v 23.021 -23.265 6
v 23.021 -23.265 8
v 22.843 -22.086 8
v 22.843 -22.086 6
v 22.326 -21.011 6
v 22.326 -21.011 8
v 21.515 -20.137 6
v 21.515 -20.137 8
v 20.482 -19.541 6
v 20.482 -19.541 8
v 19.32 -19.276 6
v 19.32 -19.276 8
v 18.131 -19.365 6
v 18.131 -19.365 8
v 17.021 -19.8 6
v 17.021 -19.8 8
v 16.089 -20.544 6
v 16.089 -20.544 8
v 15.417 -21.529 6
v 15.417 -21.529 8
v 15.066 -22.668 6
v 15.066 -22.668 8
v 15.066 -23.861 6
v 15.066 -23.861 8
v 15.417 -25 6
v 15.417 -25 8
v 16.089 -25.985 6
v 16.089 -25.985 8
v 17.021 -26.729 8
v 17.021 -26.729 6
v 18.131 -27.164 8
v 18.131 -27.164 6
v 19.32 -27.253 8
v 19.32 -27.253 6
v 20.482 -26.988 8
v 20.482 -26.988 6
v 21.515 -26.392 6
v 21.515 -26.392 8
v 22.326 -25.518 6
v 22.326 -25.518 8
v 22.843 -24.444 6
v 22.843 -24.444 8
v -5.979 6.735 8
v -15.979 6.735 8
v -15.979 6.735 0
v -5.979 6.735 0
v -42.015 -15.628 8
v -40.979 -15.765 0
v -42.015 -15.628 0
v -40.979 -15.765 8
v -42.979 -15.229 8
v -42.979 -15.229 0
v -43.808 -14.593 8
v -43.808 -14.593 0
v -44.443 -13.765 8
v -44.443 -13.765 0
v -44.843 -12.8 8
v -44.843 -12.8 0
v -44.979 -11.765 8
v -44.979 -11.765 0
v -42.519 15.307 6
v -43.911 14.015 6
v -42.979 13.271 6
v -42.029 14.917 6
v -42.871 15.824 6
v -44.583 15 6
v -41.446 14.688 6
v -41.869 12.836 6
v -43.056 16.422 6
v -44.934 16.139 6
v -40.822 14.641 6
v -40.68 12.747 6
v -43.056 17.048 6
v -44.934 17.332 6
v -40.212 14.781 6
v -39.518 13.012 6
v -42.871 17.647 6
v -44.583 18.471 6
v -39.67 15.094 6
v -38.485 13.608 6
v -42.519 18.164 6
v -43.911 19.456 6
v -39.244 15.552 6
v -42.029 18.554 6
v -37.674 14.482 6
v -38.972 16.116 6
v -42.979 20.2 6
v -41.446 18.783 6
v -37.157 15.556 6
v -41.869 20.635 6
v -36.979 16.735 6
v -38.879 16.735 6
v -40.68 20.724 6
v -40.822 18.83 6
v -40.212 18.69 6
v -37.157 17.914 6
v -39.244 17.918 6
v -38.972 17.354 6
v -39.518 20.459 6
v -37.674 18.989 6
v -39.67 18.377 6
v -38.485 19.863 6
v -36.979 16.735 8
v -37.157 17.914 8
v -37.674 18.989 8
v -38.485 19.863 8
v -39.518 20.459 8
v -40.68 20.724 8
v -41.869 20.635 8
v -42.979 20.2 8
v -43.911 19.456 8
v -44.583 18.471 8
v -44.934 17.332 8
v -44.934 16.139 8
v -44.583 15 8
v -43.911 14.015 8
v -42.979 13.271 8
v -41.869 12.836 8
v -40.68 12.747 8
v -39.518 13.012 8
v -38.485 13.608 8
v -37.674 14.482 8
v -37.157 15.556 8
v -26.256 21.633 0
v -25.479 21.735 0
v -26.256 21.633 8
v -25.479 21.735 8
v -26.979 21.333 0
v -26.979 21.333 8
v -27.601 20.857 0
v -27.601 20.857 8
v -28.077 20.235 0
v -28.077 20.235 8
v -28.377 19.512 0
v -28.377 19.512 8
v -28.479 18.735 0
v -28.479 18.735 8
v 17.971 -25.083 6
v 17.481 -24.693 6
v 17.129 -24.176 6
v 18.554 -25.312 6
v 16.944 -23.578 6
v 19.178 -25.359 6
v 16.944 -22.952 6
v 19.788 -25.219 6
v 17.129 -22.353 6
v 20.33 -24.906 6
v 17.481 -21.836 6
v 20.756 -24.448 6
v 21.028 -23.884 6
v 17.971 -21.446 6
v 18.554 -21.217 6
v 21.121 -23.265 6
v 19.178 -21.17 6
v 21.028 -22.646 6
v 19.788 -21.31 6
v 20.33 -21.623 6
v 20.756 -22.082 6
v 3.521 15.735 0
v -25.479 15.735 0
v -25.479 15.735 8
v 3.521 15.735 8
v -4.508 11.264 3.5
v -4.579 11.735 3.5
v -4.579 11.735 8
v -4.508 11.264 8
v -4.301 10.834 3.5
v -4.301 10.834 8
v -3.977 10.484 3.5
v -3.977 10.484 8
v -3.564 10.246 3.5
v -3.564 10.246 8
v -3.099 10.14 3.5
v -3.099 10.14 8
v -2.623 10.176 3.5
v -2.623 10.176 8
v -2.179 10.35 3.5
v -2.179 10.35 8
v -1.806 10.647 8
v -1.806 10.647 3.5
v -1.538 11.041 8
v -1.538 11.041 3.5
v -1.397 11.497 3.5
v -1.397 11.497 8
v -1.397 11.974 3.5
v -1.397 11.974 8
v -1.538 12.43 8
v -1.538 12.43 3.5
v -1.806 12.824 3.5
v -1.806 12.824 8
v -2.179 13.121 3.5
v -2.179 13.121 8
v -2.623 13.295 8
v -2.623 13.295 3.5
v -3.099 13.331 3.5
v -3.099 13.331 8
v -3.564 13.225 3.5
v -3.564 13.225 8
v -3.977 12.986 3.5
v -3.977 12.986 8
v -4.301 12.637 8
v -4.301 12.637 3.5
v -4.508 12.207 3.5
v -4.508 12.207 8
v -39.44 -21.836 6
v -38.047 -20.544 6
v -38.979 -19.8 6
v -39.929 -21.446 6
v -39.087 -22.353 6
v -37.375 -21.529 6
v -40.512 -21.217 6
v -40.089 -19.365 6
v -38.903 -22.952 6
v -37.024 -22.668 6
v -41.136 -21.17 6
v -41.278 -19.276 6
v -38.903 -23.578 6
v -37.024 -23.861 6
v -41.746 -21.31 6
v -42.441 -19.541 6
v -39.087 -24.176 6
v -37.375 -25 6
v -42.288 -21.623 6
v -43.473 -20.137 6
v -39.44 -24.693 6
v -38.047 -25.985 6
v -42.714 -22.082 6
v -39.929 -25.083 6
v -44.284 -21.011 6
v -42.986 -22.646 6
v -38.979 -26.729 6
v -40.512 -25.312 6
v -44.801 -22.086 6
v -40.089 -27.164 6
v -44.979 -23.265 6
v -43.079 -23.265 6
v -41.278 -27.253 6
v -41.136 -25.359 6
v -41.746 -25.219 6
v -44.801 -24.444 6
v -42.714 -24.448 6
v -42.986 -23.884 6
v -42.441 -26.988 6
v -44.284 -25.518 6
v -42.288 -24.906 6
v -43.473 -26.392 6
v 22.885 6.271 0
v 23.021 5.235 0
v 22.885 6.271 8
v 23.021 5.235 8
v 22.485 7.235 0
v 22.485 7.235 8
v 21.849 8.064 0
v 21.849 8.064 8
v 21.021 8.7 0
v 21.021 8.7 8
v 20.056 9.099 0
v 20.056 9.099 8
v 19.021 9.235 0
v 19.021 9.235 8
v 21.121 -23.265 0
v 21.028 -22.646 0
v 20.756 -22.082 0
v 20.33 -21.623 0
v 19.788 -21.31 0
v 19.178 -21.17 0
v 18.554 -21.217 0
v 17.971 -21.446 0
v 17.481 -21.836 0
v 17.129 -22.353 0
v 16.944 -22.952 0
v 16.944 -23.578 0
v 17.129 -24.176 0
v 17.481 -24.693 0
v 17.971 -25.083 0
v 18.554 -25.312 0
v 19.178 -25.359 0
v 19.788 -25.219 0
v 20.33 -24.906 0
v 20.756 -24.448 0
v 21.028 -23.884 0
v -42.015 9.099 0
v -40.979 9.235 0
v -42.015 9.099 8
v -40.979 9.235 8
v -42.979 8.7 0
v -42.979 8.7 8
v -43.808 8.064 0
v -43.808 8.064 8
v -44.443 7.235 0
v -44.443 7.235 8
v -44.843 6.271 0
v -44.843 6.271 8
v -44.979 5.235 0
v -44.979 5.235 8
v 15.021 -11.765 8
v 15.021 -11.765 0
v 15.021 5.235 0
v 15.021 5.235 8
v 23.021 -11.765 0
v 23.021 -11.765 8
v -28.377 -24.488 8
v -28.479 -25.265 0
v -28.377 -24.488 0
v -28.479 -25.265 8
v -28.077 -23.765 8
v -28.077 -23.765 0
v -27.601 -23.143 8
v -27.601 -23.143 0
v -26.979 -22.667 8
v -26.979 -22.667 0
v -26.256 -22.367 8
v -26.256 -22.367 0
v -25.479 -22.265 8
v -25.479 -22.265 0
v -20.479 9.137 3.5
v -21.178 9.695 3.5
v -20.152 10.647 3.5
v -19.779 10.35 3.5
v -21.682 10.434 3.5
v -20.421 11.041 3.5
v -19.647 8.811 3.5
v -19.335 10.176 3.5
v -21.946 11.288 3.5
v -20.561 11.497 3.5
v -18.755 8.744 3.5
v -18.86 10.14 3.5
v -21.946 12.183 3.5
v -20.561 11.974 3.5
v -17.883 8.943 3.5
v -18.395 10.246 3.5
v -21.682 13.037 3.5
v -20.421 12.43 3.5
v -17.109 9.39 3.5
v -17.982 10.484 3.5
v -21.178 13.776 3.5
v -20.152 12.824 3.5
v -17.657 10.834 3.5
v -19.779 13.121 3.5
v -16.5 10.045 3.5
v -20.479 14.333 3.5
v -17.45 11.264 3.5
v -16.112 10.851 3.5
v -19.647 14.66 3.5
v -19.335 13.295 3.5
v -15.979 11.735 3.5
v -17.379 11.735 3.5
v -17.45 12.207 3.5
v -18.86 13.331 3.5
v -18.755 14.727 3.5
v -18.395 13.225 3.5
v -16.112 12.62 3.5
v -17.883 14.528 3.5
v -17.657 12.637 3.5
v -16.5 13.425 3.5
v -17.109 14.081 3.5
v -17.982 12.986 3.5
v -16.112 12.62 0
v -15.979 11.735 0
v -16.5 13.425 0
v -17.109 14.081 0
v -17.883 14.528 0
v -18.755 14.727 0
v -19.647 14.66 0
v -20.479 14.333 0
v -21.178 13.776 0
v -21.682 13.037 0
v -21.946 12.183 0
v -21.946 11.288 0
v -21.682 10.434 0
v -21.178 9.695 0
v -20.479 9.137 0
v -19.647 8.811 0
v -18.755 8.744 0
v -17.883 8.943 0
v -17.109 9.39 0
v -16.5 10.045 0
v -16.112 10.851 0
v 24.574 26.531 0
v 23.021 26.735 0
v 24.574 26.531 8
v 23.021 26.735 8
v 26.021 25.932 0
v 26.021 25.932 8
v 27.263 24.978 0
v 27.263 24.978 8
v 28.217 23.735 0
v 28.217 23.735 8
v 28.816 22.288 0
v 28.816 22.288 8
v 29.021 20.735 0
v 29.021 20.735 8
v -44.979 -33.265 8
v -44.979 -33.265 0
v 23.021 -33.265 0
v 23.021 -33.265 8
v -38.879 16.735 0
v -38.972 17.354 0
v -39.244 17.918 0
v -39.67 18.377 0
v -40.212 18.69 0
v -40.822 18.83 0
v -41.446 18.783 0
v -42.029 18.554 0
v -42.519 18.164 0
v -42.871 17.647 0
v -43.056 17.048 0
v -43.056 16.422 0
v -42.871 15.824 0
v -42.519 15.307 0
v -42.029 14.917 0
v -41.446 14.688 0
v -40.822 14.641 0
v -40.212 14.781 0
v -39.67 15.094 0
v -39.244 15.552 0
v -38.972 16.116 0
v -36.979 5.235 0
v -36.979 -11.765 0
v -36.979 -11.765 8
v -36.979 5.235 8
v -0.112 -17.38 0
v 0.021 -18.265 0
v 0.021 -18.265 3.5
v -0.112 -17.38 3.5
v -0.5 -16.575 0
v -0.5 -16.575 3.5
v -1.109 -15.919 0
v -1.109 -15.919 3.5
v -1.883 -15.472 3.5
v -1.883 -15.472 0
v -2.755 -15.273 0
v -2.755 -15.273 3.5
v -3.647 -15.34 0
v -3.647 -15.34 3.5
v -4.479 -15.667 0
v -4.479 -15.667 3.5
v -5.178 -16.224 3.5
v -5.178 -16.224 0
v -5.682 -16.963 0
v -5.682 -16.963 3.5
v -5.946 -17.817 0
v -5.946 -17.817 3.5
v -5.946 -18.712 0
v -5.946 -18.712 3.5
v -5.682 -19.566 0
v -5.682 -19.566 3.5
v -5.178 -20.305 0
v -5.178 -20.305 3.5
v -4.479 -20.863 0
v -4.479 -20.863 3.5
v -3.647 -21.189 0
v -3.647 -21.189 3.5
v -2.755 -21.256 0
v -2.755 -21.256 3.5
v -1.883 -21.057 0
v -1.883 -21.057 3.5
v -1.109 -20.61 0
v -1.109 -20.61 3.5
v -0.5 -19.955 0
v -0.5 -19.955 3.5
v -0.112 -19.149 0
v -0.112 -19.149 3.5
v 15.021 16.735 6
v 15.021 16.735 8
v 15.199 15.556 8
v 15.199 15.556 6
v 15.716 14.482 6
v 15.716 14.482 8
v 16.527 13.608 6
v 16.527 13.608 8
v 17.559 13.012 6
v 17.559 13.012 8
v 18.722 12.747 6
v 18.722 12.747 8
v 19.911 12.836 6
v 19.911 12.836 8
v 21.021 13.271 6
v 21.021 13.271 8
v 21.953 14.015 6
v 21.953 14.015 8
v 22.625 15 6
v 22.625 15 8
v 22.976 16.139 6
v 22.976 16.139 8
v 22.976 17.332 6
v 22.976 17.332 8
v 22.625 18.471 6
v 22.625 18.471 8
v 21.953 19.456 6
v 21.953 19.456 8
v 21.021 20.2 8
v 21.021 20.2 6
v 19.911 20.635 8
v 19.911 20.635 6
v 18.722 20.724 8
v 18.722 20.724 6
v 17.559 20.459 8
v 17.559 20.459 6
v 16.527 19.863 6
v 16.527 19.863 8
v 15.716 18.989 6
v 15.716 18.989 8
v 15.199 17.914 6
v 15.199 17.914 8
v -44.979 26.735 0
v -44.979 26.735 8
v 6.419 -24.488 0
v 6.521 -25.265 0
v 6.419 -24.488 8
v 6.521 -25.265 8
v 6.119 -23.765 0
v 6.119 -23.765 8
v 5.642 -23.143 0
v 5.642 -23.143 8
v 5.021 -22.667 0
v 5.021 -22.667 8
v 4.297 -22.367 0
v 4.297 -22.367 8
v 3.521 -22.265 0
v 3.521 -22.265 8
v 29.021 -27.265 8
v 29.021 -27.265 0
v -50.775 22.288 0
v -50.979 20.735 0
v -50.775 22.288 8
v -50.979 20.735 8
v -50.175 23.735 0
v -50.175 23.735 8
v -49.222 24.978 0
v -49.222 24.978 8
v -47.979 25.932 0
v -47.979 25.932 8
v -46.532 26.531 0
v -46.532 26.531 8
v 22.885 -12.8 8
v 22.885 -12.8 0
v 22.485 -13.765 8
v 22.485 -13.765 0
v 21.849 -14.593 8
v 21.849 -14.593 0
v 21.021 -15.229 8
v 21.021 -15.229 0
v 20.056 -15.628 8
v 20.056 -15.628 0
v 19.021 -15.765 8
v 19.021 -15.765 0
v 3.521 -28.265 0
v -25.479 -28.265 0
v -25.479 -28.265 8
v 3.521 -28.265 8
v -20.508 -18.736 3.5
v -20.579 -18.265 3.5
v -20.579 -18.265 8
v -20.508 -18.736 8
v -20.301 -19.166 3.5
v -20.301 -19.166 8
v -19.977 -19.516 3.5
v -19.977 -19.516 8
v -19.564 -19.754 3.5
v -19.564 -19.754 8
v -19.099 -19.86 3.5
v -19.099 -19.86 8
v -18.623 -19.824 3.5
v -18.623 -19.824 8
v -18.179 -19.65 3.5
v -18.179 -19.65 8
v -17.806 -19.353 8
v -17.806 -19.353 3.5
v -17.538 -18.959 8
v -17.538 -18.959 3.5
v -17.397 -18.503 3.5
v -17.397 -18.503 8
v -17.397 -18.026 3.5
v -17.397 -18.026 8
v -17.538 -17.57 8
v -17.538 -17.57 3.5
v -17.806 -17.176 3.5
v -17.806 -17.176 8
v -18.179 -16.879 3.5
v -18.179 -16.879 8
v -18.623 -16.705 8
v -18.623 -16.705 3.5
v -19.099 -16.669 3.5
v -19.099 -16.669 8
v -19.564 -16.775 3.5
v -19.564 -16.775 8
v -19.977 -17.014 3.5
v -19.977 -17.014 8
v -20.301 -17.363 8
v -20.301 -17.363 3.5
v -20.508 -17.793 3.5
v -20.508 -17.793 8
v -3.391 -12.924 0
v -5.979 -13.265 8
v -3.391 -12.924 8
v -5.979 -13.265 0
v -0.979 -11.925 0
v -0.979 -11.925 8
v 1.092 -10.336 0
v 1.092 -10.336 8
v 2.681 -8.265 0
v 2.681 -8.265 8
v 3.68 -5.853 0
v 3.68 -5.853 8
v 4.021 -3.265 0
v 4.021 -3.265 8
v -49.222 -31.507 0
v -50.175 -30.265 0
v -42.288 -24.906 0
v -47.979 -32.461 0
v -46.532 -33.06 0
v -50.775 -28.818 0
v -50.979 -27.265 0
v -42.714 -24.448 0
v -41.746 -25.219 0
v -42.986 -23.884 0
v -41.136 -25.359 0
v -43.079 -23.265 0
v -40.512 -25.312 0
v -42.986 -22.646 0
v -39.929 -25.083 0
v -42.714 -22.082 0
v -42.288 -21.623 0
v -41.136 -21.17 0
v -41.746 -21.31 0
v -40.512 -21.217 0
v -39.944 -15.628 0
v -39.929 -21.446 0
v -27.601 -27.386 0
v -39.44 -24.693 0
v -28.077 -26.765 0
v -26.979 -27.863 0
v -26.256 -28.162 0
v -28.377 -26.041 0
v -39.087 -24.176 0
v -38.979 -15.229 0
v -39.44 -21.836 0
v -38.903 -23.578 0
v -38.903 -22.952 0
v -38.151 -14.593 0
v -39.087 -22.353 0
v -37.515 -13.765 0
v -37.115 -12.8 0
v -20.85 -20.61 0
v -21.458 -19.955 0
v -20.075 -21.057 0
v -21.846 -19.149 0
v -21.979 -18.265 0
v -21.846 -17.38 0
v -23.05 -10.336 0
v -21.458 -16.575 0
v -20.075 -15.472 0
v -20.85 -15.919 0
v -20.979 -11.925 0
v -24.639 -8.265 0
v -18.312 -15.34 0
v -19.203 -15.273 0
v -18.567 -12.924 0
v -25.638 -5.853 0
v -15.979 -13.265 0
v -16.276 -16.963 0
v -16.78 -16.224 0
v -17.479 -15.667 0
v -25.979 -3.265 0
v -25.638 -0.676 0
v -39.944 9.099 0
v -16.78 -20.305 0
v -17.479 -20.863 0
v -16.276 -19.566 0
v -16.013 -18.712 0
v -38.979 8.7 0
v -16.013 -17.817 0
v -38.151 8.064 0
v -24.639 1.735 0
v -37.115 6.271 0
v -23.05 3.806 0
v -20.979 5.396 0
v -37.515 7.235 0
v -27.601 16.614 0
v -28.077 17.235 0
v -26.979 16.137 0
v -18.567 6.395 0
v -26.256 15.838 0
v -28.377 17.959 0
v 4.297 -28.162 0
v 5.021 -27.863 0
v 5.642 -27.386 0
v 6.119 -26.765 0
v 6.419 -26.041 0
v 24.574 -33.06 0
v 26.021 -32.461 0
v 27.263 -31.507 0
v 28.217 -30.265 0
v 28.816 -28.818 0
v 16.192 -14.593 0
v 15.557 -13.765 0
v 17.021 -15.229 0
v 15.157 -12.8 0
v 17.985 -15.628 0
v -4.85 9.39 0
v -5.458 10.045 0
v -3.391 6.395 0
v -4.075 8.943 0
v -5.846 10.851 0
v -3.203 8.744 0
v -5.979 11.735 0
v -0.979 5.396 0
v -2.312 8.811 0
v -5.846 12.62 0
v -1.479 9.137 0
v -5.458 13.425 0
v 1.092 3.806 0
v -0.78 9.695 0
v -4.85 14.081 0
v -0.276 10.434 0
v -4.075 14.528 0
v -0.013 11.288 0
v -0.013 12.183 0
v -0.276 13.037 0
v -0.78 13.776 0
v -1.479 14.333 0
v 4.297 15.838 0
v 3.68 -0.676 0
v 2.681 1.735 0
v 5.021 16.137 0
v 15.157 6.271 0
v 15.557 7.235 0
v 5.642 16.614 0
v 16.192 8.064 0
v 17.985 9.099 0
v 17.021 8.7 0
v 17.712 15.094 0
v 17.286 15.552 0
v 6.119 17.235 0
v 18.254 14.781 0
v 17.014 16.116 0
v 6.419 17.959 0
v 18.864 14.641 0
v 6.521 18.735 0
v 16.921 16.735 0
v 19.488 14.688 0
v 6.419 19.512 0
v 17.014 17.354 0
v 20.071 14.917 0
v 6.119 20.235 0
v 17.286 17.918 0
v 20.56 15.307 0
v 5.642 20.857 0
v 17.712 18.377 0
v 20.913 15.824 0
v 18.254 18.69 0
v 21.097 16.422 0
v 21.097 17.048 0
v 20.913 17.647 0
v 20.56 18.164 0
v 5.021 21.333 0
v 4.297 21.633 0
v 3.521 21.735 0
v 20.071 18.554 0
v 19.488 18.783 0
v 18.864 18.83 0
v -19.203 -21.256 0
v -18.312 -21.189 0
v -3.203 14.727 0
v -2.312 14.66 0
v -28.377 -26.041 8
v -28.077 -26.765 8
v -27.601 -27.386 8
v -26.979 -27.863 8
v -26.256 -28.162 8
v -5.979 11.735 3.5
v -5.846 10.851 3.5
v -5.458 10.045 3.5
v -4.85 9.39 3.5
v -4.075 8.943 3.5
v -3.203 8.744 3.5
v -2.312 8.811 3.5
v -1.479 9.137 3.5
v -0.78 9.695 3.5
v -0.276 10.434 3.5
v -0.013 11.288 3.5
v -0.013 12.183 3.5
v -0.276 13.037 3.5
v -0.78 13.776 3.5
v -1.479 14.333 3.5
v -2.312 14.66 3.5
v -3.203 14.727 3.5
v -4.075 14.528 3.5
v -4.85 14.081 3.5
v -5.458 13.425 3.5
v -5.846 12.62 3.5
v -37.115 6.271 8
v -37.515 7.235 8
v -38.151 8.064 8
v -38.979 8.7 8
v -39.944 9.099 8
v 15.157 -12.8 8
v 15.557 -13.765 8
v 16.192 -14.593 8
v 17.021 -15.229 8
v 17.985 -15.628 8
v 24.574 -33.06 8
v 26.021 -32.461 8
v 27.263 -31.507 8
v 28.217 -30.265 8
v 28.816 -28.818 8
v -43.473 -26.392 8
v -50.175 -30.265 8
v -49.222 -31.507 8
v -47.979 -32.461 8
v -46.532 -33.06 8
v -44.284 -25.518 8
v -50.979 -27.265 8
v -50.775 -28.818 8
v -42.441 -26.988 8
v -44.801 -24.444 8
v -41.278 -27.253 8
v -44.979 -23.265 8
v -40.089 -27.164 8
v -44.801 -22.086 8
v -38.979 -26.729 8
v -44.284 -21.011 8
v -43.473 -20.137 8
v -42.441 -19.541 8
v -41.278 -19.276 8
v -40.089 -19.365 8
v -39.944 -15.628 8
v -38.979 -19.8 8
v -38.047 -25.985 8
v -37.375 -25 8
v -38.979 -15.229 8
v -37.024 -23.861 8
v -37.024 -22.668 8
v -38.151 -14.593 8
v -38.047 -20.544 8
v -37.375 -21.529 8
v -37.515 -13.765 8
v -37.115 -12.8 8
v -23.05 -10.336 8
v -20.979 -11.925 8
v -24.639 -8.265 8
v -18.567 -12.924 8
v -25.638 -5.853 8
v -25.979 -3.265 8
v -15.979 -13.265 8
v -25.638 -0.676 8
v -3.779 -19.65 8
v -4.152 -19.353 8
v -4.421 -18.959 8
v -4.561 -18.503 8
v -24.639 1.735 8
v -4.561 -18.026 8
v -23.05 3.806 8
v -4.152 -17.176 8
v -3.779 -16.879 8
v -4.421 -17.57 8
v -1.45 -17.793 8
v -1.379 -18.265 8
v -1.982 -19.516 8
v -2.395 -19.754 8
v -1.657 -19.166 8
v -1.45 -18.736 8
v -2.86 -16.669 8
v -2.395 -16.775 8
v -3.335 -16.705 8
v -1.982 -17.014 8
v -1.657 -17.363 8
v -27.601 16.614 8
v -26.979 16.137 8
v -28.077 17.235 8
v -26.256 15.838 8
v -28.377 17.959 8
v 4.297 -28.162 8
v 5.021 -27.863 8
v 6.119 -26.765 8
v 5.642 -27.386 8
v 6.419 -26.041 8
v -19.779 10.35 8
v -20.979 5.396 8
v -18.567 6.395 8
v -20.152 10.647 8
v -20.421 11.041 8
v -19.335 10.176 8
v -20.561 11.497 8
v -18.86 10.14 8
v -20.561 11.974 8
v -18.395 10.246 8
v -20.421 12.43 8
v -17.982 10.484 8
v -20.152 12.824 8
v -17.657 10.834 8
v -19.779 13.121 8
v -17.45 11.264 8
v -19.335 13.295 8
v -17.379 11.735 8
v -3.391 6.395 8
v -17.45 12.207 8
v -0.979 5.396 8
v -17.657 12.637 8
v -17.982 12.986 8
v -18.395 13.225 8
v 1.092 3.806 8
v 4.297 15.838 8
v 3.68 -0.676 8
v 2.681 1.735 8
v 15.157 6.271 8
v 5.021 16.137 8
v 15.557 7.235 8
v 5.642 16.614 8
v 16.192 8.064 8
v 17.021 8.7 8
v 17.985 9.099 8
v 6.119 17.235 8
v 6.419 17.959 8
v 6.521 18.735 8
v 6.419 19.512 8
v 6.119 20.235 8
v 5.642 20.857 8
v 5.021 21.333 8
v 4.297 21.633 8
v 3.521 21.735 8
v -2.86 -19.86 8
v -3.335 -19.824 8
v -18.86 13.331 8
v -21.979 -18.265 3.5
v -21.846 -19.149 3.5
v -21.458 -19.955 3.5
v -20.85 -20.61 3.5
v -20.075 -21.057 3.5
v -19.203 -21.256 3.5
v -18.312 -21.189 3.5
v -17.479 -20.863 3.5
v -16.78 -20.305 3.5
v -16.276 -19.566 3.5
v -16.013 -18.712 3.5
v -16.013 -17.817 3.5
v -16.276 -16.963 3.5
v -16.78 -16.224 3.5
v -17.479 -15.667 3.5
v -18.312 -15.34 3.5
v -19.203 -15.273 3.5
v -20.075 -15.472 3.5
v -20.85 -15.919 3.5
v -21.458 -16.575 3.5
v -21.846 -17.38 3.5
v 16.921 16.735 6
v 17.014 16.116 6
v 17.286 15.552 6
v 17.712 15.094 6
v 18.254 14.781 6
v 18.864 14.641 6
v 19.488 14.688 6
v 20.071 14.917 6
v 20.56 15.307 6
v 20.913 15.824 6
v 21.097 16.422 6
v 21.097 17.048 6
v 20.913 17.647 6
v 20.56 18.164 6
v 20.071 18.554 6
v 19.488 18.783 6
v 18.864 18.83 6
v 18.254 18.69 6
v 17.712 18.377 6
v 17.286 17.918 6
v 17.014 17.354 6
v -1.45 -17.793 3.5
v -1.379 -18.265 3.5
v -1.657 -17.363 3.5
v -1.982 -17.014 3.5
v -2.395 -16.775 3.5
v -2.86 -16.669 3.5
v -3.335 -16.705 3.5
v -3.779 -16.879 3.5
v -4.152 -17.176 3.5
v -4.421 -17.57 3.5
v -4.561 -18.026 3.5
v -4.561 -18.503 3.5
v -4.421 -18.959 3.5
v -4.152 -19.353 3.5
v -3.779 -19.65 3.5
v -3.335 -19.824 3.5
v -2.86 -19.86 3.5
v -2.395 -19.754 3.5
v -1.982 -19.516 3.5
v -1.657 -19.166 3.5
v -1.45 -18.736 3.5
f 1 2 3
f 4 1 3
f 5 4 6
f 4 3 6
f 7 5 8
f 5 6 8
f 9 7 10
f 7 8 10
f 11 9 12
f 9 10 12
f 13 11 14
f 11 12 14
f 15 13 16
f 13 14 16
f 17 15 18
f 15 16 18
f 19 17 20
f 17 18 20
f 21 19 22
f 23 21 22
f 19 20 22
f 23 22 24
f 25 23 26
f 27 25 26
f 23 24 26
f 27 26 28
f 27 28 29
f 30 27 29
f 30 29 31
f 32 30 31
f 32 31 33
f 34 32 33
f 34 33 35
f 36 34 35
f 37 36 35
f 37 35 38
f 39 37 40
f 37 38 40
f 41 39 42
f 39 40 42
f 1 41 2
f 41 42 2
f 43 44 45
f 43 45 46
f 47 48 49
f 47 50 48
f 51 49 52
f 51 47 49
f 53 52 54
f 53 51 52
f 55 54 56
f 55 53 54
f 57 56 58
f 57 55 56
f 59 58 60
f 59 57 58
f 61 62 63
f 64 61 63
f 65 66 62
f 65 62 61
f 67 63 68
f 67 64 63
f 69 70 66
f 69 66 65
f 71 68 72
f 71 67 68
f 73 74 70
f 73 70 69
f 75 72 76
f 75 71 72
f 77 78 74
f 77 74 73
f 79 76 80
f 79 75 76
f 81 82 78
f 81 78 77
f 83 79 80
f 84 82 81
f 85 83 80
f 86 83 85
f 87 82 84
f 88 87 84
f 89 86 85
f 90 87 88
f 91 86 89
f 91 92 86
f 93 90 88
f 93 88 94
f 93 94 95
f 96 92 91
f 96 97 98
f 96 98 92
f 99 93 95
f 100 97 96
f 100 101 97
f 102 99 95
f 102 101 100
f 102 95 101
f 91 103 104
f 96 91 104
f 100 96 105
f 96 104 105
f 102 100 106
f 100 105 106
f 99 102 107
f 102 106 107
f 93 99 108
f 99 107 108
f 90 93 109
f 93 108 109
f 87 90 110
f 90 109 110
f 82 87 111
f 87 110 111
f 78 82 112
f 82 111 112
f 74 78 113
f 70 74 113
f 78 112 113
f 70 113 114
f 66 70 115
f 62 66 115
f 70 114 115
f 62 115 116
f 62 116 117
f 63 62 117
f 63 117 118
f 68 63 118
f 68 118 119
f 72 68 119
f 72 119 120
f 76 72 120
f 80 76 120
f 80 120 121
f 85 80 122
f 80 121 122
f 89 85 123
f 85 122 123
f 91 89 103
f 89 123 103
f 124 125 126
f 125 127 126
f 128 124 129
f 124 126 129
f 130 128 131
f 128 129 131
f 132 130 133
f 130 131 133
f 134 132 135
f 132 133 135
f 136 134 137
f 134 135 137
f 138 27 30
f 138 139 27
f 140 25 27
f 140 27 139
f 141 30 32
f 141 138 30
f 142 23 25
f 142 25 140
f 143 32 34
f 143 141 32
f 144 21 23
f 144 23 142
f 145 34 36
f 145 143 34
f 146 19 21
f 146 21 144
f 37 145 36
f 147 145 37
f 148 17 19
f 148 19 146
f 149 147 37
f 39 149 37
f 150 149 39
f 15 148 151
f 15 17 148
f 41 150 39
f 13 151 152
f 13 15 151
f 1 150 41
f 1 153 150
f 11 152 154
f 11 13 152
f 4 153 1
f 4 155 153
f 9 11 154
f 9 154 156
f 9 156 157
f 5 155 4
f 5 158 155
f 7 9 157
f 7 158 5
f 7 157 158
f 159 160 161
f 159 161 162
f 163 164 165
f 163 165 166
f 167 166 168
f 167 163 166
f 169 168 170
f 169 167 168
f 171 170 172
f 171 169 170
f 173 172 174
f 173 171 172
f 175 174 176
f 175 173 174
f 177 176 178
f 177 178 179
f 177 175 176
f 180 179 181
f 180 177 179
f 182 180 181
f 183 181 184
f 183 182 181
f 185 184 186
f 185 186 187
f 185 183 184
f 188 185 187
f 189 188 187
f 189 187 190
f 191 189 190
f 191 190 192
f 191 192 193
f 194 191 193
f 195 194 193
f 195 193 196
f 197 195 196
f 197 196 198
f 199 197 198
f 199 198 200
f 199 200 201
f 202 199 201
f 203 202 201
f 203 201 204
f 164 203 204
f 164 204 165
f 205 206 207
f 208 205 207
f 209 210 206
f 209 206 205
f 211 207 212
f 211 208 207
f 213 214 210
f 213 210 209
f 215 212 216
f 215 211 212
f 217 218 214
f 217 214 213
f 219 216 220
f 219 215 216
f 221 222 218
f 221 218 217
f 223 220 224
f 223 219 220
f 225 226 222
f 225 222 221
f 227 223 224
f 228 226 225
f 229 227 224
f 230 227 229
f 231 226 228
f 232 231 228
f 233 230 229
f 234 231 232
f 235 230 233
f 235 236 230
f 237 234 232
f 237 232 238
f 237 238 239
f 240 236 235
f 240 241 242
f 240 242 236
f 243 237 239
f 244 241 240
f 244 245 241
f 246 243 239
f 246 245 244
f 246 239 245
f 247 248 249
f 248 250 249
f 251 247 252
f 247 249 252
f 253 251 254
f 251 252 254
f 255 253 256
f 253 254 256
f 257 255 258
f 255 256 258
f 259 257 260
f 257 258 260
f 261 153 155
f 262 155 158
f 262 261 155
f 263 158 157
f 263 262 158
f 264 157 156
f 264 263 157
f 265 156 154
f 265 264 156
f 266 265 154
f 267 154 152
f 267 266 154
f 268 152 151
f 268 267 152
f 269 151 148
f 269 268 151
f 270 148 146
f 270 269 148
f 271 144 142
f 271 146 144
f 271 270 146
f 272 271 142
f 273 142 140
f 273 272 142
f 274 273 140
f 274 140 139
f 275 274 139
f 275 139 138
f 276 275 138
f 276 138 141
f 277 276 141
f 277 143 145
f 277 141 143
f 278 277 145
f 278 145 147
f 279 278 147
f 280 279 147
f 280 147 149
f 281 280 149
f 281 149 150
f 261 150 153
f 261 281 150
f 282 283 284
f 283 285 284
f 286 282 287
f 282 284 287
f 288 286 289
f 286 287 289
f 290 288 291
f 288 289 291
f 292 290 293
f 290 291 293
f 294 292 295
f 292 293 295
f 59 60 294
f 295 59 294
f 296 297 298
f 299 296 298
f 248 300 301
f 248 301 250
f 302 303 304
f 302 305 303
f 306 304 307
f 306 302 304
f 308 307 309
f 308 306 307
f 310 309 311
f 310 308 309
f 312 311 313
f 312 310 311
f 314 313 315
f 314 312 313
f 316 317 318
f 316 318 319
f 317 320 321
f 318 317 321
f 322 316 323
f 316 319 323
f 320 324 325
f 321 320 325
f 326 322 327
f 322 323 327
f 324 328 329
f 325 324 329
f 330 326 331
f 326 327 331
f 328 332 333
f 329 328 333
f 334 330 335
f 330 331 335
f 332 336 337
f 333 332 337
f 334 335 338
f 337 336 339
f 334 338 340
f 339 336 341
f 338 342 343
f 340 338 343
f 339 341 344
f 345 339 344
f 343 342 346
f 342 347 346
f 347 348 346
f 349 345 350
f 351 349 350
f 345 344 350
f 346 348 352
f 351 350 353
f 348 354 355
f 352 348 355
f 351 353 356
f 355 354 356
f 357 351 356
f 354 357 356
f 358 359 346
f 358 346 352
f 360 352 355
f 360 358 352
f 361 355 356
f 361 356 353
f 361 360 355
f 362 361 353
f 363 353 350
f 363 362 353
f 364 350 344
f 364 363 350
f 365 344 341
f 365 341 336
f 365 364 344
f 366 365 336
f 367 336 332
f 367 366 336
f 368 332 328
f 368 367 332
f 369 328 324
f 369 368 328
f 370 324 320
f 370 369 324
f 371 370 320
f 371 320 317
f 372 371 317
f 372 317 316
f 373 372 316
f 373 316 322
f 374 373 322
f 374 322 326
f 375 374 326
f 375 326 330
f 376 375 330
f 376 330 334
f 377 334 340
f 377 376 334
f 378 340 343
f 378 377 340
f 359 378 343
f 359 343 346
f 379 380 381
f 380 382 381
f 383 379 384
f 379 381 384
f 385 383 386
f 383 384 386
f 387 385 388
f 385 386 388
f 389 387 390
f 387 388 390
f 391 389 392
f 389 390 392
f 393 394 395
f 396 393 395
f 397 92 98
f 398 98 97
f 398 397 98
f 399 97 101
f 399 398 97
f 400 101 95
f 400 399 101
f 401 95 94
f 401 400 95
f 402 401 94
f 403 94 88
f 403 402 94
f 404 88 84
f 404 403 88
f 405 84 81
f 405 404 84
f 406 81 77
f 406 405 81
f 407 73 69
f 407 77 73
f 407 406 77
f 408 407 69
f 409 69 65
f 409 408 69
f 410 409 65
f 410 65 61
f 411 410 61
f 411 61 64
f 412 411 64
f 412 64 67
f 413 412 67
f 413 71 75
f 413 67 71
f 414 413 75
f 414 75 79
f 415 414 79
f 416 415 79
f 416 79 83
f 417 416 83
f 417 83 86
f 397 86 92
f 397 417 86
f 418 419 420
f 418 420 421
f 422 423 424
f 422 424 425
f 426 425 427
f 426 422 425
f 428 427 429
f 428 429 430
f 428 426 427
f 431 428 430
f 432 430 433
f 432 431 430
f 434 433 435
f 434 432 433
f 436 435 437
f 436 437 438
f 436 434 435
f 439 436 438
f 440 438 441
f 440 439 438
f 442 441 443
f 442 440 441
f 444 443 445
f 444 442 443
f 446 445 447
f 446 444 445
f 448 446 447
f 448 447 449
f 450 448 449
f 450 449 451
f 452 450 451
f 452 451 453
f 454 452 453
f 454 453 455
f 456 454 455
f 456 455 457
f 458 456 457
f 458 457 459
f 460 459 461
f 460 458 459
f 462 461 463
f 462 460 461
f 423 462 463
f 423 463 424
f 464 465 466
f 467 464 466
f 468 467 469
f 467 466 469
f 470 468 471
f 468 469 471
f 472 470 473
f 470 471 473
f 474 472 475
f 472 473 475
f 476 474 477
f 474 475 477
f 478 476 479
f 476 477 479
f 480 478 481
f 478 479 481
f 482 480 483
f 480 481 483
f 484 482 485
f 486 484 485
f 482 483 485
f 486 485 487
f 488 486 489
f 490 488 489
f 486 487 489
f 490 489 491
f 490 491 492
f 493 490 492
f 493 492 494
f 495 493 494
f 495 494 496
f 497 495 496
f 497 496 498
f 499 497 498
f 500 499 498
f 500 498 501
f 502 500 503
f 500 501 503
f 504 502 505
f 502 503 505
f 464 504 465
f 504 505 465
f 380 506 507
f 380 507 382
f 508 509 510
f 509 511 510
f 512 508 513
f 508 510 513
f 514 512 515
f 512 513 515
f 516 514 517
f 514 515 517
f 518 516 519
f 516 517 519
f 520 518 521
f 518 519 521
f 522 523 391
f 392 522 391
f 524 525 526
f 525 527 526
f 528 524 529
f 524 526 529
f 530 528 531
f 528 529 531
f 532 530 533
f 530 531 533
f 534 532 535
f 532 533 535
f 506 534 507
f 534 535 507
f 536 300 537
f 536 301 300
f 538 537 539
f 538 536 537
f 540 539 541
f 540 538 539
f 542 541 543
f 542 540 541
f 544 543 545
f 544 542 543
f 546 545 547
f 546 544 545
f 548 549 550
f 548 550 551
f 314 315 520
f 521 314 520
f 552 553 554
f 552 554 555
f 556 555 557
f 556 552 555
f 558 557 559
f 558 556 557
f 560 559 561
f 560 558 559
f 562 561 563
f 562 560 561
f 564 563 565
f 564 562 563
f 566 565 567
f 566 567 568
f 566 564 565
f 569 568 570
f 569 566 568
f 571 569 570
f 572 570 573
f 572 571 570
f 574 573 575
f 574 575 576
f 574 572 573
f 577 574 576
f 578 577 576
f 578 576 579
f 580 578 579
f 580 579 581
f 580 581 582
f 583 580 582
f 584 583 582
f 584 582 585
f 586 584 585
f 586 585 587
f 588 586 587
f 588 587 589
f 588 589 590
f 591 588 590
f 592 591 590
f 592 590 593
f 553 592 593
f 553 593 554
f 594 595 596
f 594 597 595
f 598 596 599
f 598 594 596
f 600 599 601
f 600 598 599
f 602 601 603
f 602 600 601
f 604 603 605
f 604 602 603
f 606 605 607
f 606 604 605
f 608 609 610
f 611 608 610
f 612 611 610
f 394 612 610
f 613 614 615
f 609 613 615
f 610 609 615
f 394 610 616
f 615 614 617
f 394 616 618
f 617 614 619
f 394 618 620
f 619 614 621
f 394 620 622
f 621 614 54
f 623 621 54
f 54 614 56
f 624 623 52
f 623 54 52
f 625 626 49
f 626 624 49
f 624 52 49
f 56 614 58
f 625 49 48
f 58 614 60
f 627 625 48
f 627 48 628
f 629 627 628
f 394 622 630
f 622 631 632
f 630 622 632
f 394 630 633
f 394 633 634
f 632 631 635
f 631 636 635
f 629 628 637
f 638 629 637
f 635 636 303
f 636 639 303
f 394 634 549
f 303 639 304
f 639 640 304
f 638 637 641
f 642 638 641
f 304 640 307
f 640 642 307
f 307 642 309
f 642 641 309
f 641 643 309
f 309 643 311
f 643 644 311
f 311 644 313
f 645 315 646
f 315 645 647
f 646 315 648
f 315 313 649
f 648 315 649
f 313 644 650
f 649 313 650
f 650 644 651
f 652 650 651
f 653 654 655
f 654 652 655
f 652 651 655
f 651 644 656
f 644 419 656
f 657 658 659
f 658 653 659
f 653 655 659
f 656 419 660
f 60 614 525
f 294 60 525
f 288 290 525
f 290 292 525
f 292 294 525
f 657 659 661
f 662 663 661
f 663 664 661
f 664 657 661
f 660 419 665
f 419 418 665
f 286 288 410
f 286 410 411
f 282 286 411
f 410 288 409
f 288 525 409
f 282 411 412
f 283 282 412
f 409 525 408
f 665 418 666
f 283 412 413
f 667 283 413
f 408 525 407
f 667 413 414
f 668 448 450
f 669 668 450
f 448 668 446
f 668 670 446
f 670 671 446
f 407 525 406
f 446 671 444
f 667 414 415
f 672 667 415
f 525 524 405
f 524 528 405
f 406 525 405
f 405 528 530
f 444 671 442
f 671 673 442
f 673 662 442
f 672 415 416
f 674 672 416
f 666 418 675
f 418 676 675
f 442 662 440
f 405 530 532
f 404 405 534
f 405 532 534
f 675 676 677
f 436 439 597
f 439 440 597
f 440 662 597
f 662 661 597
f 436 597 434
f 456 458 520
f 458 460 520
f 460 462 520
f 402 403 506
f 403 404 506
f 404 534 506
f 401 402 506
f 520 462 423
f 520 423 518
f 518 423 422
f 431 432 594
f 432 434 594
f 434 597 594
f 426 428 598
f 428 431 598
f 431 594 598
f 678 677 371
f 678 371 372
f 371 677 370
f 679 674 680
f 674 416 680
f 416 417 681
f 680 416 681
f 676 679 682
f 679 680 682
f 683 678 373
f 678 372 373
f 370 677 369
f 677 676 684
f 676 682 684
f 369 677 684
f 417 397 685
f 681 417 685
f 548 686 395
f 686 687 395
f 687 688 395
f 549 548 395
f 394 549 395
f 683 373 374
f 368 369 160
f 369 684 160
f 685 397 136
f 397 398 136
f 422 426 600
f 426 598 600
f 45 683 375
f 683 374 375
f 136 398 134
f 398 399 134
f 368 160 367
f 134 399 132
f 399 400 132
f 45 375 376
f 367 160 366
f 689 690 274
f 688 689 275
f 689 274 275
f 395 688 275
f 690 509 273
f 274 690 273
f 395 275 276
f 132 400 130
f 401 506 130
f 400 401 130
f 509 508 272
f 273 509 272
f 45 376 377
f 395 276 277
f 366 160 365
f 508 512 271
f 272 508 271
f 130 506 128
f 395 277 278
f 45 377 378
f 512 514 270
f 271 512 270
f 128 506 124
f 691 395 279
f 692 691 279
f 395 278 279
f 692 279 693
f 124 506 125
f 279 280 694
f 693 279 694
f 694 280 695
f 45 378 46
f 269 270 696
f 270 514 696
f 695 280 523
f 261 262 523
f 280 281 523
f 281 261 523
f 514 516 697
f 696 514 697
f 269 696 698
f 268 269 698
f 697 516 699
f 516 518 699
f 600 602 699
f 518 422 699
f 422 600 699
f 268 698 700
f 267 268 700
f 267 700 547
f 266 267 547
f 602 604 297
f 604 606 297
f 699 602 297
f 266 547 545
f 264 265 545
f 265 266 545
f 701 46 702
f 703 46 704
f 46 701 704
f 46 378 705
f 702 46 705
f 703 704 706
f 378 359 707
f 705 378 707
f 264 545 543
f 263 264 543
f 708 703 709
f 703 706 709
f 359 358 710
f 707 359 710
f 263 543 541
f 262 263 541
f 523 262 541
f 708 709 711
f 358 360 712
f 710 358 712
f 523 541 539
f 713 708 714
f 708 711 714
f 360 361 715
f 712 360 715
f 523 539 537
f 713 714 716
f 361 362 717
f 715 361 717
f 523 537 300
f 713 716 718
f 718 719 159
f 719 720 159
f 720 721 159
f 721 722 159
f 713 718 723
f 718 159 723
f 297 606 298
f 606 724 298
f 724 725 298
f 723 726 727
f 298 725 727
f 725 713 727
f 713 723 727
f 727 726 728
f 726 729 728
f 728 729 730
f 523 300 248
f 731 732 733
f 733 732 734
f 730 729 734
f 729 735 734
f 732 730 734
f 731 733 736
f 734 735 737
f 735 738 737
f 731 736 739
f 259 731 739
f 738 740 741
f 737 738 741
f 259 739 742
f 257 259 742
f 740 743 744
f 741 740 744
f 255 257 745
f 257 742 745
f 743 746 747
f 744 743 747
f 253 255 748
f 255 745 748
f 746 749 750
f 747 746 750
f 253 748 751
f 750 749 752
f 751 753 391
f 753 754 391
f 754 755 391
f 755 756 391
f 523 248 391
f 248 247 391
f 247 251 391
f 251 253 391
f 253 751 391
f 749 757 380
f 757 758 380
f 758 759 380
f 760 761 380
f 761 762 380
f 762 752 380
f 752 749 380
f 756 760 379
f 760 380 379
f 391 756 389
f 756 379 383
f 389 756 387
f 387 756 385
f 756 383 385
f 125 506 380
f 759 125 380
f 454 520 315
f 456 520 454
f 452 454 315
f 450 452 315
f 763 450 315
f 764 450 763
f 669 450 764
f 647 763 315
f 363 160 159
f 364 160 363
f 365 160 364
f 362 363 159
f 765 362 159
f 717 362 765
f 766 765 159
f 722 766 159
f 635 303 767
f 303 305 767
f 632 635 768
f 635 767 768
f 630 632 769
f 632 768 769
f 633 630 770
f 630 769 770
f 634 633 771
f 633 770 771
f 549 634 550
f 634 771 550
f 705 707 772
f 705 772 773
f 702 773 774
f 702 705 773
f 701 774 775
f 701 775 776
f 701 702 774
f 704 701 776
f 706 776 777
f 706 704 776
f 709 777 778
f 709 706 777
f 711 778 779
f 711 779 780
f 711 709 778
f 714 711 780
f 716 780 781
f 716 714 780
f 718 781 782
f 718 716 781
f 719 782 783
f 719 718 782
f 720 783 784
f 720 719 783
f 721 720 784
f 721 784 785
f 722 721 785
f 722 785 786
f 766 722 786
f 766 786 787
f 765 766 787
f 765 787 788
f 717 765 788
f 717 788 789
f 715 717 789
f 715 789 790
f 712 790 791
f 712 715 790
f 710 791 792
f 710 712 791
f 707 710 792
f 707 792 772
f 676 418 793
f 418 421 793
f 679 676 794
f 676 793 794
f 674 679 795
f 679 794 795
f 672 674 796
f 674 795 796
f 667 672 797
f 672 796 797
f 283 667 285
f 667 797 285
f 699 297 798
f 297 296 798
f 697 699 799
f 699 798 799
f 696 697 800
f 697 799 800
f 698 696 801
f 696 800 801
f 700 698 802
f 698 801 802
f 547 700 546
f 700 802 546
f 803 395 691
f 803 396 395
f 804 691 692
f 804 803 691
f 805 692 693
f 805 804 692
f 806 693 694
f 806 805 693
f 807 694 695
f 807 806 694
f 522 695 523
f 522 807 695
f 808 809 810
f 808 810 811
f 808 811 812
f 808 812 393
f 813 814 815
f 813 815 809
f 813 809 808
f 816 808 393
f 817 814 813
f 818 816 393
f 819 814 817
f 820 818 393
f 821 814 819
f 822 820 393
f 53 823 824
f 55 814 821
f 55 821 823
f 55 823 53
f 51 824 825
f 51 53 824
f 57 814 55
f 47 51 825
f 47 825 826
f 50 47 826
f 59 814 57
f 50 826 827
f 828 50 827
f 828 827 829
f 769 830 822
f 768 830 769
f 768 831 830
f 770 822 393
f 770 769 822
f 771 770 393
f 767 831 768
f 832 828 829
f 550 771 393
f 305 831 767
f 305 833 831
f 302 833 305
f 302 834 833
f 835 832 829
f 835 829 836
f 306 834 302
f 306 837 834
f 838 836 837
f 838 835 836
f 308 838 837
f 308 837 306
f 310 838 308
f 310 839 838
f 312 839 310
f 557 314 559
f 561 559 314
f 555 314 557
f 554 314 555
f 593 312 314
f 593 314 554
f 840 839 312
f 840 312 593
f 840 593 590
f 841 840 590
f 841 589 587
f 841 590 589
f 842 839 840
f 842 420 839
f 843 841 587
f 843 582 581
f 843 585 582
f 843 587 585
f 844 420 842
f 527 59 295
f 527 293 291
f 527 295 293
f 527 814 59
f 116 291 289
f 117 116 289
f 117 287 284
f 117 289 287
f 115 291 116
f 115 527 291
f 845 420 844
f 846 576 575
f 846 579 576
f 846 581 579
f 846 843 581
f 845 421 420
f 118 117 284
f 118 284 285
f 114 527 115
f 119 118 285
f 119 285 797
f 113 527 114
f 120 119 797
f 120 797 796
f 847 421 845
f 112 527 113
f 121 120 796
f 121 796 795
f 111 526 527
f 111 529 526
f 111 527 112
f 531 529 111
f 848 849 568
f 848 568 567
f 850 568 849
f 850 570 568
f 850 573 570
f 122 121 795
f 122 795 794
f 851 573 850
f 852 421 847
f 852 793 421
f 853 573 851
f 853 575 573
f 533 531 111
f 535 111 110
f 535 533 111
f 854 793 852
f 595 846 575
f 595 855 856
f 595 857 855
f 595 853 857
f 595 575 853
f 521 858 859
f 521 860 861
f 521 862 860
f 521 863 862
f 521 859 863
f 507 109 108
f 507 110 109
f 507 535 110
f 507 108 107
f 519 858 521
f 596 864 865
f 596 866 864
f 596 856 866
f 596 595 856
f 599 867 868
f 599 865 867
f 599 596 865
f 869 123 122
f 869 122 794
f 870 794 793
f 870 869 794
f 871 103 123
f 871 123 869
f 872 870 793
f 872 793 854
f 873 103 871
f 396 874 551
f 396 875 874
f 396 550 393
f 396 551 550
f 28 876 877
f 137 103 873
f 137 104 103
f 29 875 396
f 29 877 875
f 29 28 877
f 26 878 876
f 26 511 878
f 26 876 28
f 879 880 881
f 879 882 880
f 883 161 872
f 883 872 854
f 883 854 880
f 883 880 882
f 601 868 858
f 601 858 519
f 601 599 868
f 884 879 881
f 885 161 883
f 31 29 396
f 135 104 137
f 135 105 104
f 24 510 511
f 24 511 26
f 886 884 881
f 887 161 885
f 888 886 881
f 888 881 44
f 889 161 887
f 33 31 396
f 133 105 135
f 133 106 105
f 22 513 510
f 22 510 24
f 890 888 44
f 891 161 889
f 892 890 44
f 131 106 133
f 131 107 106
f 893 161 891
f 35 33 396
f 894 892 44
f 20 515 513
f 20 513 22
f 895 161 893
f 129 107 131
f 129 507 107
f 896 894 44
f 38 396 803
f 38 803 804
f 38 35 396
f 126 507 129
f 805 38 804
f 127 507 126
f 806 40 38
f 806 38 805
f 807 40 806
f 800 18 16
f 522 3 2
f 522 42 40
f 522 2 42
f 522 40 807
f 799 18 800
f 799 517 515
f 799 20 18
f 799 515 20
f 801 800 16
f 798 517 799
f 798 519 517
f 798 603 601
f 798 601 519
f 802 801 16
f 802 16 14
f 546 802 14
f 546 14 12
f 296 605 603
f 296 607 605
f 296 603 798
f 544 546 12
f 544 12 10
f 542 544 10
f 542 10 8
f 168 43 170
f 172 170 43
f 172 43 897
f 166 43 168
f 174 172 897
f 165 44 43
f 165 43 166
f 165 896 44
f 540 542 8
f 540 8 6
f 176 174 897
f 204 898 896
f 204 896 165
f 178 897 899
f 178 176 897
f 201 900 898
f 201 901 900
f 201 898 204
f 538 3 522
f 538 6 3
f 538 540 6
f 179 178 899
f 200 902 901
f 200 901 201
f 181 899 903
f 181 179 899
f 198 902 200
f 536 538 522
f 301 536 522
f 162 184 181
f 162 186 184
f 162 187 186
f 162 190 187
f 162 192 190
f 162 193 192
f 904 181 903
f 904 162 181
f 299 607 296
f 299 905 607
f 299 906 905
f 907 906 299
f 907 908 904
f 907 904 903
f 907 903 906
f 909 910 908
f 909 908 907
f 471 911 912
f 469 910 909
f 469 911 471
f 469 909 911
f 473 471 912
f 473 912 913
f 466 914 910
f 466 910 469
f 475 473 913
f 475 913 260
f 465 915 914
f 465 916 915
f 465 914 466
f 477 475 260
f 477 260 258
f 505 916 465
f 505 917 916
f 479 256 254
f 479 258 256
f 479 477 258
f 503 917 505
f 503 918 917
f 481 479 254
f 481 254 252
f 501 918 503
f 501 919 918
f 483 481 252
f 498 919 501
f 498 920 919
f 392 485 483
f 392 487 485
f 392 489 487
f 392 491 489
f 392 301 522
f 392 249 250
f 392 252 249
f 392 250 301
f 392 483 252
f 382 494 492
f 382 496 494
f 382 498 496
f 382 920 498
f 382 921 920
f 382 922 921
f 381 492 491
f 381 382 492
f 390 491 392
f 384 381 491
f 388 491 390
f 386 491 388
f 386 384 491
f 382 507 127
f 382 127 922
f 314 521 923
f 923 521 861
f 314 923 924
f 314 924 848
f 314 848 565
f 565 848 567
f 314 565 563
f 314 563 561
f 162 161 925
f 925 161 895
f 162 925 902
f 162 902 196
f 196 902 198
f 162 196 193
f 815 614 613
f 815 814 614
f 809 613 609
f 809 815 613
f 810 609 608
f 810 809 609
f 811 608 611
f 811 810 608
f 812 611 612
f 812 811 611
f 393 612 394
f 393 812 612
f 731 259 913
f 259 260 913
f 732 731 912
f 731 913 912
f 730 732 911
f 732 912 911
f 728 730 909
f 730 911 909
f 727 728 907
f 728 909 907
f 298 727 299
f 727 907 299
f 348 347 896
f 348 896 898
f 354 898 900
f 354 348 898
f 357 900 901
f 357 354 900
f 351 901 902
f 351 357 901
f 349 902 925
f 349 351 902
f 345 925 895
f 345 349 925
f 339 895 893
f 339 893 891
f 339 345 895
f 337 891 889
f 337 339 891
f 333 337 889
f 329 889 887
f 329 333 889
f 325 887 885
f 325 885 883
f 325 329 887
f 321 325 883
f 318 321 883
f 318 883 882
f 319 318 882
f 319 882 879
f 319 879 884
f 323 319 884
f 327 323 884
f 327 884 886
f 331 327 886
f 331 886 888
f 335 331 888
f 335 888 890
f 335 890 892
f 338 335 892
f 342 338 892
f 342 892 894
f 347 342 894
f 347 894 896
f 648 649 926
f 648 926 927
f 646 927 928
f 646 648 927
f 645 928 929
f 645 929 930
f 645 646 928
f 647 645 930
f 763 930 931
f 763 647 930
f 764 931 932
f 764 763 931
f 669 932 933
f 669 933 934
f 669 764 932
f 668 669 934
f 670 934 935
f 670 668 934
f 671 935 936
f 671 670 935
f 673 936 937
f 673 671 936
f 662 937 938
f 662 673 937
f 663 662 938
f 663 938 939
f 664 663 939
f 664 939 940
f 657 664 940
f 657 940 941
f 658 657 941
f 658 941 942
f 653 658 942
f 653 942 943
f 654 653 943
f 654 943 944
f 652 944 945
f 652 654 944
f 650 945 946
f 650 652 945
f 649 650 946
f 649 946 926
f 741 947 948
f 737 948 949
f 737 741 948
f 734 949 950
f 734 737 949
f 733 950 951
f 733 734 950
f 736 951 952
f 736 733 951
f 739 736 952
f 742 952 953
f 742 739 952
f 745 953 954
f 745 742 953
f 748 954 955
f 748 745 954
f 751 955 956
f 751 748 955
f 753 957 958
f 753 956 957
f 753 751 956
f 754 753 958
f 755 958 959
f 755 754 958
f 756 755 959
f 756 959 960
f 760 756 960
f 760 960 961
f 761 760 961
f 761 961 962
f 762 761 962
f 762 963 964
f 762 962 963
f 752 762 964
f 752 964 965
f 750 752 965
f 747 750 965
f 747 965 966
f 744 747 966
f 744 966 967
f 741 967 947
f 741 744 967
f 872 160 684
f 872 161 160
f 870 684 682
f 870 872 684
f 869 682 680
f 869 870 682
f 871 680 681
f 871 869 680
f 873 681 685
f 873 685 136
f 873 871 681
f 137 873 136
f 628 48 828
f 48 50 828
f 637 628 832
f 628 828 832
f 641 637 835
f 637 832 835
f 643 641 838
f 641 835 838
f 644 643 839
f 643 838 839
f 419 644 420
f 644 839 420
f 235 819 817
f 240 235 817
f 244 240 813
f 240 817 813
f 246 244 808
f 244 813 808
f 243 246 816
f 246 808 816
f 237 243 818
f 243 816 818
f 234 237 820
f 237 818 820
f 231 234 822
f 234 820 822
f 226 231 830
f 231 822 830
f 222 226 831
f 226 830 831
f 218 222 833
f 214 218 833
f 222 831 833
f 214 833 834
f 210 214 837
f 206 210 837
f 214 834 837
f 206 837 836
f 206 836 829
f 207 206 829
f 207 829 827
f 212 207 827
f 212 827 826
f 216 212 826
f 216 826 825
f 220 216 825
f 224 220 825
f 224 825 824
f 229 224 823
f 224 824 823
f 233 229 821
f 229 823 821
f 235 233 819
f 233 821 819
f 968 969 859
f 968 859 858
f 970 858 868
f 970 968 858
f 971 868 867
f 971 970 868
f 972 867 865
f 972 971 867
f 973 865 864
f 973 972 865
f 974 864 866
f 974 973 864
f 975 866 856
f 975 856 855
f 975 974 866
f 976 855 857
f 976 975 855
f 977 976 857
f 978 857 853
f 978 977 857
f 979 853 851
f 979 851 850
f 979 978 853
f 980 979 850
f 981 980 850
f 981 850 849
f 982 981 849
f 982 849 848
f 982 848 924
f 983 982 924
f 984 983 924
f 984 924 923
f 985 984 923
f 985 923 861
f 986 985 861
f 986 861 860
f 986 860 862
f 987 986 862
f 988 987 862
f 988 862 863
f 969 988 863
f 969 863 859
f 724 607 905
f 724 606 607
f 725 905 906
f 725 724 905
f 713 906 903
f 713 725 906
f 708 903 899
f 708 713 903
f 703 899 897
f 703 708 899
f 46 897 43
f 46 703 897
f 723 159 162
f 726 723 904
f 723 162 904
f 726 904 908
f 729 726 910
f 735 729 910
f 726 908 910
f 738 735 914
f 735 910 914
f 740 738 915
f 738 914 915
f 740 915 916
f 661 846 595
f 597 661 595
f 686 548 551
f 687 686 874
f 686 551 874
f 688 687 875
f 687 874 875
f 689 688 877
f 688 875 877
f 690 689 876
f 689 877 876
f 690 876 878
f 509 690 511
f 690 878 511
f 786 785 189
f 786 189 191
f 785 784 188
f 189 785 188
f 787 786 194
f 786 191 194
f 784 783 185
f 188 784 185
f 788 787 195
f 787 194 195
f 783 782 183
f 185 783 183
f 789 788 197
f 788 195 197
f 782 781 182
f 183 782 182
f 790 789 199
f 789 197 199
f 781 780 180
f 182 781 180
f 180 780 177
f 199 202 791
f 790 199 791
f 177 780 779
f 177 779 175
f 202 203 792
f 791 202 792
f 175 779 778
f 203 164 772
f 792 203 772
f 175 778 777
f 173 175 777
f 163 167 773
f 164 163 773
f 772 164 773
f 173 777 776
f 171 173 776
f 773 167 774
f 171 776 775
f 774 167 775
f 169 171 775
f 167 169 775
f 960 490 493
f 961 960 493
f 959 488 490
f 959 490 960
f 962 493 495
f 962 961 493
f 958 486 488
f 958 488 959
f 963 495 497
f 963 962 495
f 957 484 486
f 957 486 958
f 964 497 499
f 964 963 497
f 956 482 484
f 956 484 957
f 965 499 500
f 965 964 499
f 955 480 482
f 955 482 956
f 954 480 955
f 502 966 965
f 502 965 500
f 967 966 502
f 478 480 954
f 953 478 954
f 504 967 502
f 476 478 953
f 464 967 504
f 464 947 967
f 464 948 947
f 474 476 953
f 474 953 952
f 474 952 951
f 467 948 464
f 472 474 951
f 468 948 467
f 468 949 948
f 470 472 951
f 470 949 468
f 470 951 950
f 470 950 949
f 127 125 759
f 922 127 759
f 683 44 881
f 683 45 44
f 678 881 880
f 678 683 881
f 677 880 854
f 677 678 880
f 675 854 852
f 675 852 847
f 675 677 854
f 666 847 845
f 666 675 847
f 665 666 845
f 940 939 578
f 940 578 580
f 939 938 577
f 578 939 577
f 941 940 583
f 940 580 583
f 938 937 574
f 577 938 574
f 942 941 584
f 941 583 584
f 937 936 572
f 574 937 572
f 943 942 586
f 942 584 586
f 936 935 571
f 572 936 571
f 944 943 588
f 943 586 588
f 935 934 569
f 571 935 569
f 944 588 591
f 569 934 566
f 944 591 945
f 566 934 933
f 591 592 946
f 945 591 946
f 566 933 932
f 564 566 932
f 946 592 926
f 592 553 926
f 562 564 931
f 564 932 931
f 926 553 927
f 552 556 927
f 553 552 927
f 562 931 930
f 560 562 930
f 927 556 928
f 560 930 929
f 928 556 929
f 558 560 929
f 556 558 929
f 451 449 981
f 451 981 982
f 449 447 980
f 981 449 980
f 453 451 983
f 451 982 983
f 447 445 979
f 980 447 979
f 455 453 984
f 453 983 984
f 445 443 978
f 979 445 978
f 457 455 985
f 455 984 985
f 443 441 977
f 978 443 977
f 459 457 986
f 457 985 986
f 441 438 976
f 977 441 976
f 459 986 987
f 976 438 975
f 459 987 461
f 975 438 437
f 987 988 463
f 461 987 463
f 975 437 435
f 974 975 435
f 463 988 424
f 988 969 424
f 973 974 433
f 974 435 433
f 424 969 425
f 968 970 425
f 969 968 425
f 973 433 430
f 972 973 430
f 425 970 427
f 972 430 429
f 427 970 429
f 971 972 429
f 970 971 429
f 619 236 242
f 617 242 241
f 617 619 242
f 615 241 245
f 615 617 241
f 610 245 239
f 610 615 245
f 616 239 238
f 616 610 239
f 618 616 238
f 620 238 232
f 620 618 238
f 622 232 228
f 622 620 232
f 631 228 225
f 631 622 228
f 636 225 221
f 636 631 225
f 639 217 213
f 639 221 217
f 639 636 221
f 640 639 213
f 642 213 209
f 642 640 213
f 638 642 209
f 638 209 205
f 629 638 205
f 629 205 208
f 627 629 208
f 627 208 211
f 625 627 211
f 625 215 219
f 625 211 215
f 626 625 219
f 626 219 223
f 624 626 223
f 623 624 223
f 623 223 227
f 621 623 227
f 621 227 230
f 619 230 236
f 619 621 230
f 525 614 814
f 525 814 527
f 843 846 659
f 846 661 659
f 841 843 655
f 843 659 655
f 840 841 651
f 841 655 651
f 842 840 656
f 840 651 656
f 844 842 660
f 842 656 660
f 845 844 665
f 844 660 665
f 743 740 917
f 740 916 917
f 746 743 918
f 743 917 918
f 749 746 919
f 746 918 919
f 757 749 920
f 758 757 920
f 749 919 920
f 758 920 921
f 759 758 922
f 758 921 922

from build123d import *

# Parameters (mm, degrees)
SKETCH_1_W             = 80
SKETCH_1_H             = 60
SKETCH_1_R             = 2.1
SKETCH_1_R_2           = 1.6
EXTRUDE_2_DEPTH        = 8
SKETCH_1_3_R           = 3
CUT_EXTRUDE_2_DEPTH    = 3.5
FILLET_1_R             = 6
SKETCH_1_4_W           = 35
SKETCH_1_4_H           = 6
CUT_EXTRUDE_3_DEPTH    = 62.395513597
FILLET_2_R             = 3
FILLET_2_OF_MIRROR_1_R = 3
SKETCH_1_5_W           = 8
SKETCH_1_5_H           = 25
CUT_EXTRUDE_4_DEPTH    = 62.395513597
FILLET_3_R             = 4
FILLET_3_OF_MIRROR_2_R = 4
SKETCH_2_R             = 4
CUT_EXTRUDE_5_DEPTH    = 2
SKETCH_3_W             = 30
SKETCH_3_H             = 20
CUT_EXTRUDE_6_DEPTH    = 10
FILLET_4_R             = 10


with BuildPart() as part:
    # 草图1 → 凸台-拉伸2 (new body)
    with BuildSketch(Plane.XY):
        with Locations((-10.979166634, -3.26460069)):
            Rectangle(SKETCH_1_W, SKETCH_1_H)
        with Locations((-40.979166634, 16.73539931)):
            Circle(SKETCH_1_R, mode=Mode.SUBTRACT)
        with Locations(Location((19.020833366, 16.73539931, 0), (0, 0, 180))):
            Circle(SKETCH_1_R, mode=Mode.SUBTRACT)
        with Locations((19.020833366, -23.26460069)):
            Circle(SKETCH_1_R, mode=Mode.SUBTRACT)
        with Locations(Location((-40.979166634, -23.26460069, 0), (0, 0, 180))):
            Circle(SKETCH_1_R, mode=Mode.SUBTRACT)
        with Locations((-18.979166634, 11.73539931)):
            Circle(SKETCH_1_R_2, mode=Mode.SUBTRACT)
        with Locations(Location((-2.979166634, 11.73539931, 0), (0, 0, 180))):
            Circle(SKETCH_1_R_2, mode=Mode.SUBTRACT)
        with Locations((-2.979166634, -18.26460069)):
            Circle(SKETCH_1_R_2, mode=Mode.SUBTRACT)
        with Locations(Location((-18.979166634, -18.26460069, 0), (0, 0, 180))):
            Circle(SKETCH_1_R_2, mode=Mode.SUBTRACT)
    extrude(amount=EXTRUDE_2_DEPTH)

    # 草图1<3> → 切除-拉伸2 (cut)
    with BuildSketch(Plane.XY):
        with Locations((-18.979166634, 11.73539931)):
            Circle(SKETCH_1_3_R)
        with Locations(Location((-2.979166634, 11.73539931, 0), (0, 0, 180))):
            Circle(SKETCH_1_3_R)
        with Locations((-2.979166634, -18.26460069)):
            Circle(SKETCH_1_3_R)
        with Locations(Location((-18.979166634, -18.26460069, 0), (0, 0, 180))):
            Circle(SKETCH_1_3_R)
    extrude(amount=CUT_EXTRUDE_2_DEPTH, mode=Mode.SUBTRACT)

    # 圆角1
    fillet_1_edges = [part.edges().sort_by_distance(p)[0] for p in [
        (-50.979166634, 26.73539931, 4),
        (-50.979166634, -33.26460069, 4),
        (29.020833366, -33.26460069, 4),
        (29.020833366, 26.73539931, 4),
    ]]
    fillet(fillet_1_edges, radius=FILLET_1_R)

    # 草图1<4> → 切除-拉伸3 (cut, through all)
    with BuildSketch(Plane.XY):
        with Locations((-10.979166634, 18.73539931)):
            Rectangle(SKETCH_1_4_W, SKETCH_1_4_H)
    cut_extrude_3 = extrude(amount=CUT_EXTRUDE_3_DEPTH, mode=Mode.SUBTRACT)

    # 圆角2
    fillet_2_edges = [part.edges().sort_by_distance(p)[0] for p in [
        (6.520833366, 15.73539931, 4),
        (6.520833366, 21.73539931, 4),
        (-28.479166634, 15.73539931, 4),
        (-28.479166634, 21.73539931, 4),
    ]]
    fillet(fillet_2_edges, radius=FILLET_2_R - 0.0001)  # a hair under: the kernel refuses the full size

    # 镜向1: 切除-拉伸3 across plane
    add(cut_extrude_3.mirror(Plane.ZX.offset(-3.26460069)), mode=Mode.SUBTRACT)

    # 圆角2 of 镜向1
    fillet_2_of_mirror_1_edges = [part.edges().sort_by_distance(p)[0] for p in [
        (6.520833366, -22.26460069, 4),
        (6.520833366, -28.26460069, 4),
        (-28.479166634, -22.26460069, 4),
        (-28.479166634, -28.26460069, 4),
    ]]
    fillet(fillet_2_of_mirror_1_edges, radius=FILLET_2_OF_MIRROR_1_R - 0.0001)  # a hair under: the kernel refuses the full size

    # 草图1<5> → 切除-拉伸4 (cut, through all)
    with BuildSketch(Plane.XY):
        with Locations((-40.979166634, -3.26460069)):
            Rectangle(SKETCH_1_5_W, SKETCH_1_5_H)
    cut_extrude_4 = extrude(amount=CUT_EXTRUDE_4_DEPTH, mode=Mode.SUBTRACT)

    # 圆角3
    fillet_3_edges = [part.edges().sort_by_distance(p)[0] for p in [
        (-36.979166634, -15.76460069, 4),
        (-44.979166634, -15.76460069, 4),
        (-36.979166634, 9.23539931, 4),
        (-44.979166634, 9.23539931, 4),
    ]]
    fillet(fillet_3_edges, radius=FILLET_3_R - 0.0001)  # a hair under: the kernel refuses the full size

    # 镜向2: 切除-拉伸4 across plane
    add(cut_extrude_4.mirror(Plane.ZY.offset(10.979166634)), mode=Mode.SUBTRACT)

    # 圆角3 of 镜向2
    fillet_3_of_mirror_2_edges = [part.edges().sort_by_distance(p)[0] for p in [
        (15.020833366, -15.76460069, 4),
        (23.020833366, -15.76460069, 4),
        (15.020833366, 9.23539931, 4),
        (23.020833366, 9.23539931, 4),
    ]]
    fillet(fillet_3_of_mirror_2_edges, radius=FILLET_3_OF_MIRROR_2_R - 0.0001)  # a hair under: the kernel refuses the full size

    # 草图2 → 切除-拉伸5 (cut)
    with BuildSketch(Plane.XY.offset(8)):
        with Locations((-40.979166634, 16.73539931)):
            Circle(SKETCH_2_R)
        with Locations(Location((19.020833366, 16.73539931, 0), (0, 0, 180))):
            Circle(SKETCH_2_R)
        with Locations((19.020833366, -23.26460069)):
            Circle(SKETCH_2_R)
        with Locations(Location((-40.979166634, -23.26460069, 0), (0, 0, 180))):
            Circle(SKETCH_2_R)
    extrude(amount=-CUT_EXTRUDE_5_DEPTH, mode=Mode.SUBTRACT)

    # 草图3 → 切除-拉伸6 (cut)
    with BuildSketch(Plane.XY.offset(8)):
        with Locations((-10.979166634, -3.26460069)):
            Rectangle(SKETCH_3_W, SKETCH_3_H)
    extrude(amount=-CUT_EXTRUDE_6_DEPTH, mode=Mode.SUBTRACT)

    # 圆角4
    fillet_4_edges = [part.edges().sort_by_distance(p)[0] for p in [
        (4.020833366, -13.26460069, 4),
        (-25.979166634, -13.26460069, 4),
        (4.020833366, 6.73539931, 4),
        (-25.979166634, 6.73539931, 4),
    ]]
    fillet(fillet_4_edges, radius=FILLET_4_R - 0.0001)  # a hair under: the kernel refuses the full size


solid = part.part
